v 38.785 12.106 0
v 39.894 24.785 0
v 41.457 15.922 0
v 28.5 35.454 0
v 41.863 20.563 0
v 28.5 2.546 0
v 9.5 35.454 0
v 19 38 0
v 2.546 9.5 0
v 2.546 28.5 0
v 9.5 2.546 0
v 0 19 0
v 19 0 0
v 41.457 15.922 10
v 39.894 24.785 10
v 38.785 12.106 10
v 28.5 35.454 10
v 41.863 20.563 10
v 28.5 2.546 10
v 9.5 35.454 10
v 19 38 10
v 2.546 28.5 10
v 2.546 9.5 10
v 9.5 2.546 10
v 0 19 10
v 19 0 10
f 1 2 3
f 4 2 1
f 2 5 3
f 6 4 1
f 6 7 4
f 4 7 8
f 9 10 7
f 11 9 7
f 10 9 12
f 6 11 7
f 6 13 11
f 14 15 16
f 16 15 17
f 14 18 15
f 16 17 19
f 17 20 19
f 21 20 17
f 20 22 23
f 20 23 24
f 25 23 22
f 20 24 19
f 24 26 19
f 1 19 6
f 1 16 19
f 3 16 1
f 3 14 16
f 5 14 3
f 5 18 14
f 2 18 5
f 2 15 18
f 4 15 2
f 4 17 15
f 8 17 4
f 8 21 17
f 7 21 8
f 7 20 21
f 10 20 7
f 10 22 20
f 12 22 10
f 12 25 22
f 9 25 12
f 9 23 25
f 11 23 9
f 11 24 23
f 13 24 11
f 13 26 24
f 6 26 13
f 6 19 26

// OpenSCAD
$fn = 32;

// ----------------------------------------------------------------------
// Eccentric disc: step, 10 mm thick
// ----------------------------------------------------------------------

// --- parameters (mm) ---
profile_height = 10;      // extrusion height
profile_points = 13;      // points of the closed outline

profile = [[0, 19], [2.546, 9.5], [9.5, 2.546], [19, 0], [28.5, 2.546], [38.785, 12.106], [41.457, 15.922], [41.863, 20.563], [39.894, 24.785], [28.5, 35.454], [19, 38], [9.5, 35.454], [2.546, 28.5]];  // single closed polygon, 13 points, counter clockwise

// --- the one profile operation ---
linear_extrude(height = profile_height) polygon(points = profile);
